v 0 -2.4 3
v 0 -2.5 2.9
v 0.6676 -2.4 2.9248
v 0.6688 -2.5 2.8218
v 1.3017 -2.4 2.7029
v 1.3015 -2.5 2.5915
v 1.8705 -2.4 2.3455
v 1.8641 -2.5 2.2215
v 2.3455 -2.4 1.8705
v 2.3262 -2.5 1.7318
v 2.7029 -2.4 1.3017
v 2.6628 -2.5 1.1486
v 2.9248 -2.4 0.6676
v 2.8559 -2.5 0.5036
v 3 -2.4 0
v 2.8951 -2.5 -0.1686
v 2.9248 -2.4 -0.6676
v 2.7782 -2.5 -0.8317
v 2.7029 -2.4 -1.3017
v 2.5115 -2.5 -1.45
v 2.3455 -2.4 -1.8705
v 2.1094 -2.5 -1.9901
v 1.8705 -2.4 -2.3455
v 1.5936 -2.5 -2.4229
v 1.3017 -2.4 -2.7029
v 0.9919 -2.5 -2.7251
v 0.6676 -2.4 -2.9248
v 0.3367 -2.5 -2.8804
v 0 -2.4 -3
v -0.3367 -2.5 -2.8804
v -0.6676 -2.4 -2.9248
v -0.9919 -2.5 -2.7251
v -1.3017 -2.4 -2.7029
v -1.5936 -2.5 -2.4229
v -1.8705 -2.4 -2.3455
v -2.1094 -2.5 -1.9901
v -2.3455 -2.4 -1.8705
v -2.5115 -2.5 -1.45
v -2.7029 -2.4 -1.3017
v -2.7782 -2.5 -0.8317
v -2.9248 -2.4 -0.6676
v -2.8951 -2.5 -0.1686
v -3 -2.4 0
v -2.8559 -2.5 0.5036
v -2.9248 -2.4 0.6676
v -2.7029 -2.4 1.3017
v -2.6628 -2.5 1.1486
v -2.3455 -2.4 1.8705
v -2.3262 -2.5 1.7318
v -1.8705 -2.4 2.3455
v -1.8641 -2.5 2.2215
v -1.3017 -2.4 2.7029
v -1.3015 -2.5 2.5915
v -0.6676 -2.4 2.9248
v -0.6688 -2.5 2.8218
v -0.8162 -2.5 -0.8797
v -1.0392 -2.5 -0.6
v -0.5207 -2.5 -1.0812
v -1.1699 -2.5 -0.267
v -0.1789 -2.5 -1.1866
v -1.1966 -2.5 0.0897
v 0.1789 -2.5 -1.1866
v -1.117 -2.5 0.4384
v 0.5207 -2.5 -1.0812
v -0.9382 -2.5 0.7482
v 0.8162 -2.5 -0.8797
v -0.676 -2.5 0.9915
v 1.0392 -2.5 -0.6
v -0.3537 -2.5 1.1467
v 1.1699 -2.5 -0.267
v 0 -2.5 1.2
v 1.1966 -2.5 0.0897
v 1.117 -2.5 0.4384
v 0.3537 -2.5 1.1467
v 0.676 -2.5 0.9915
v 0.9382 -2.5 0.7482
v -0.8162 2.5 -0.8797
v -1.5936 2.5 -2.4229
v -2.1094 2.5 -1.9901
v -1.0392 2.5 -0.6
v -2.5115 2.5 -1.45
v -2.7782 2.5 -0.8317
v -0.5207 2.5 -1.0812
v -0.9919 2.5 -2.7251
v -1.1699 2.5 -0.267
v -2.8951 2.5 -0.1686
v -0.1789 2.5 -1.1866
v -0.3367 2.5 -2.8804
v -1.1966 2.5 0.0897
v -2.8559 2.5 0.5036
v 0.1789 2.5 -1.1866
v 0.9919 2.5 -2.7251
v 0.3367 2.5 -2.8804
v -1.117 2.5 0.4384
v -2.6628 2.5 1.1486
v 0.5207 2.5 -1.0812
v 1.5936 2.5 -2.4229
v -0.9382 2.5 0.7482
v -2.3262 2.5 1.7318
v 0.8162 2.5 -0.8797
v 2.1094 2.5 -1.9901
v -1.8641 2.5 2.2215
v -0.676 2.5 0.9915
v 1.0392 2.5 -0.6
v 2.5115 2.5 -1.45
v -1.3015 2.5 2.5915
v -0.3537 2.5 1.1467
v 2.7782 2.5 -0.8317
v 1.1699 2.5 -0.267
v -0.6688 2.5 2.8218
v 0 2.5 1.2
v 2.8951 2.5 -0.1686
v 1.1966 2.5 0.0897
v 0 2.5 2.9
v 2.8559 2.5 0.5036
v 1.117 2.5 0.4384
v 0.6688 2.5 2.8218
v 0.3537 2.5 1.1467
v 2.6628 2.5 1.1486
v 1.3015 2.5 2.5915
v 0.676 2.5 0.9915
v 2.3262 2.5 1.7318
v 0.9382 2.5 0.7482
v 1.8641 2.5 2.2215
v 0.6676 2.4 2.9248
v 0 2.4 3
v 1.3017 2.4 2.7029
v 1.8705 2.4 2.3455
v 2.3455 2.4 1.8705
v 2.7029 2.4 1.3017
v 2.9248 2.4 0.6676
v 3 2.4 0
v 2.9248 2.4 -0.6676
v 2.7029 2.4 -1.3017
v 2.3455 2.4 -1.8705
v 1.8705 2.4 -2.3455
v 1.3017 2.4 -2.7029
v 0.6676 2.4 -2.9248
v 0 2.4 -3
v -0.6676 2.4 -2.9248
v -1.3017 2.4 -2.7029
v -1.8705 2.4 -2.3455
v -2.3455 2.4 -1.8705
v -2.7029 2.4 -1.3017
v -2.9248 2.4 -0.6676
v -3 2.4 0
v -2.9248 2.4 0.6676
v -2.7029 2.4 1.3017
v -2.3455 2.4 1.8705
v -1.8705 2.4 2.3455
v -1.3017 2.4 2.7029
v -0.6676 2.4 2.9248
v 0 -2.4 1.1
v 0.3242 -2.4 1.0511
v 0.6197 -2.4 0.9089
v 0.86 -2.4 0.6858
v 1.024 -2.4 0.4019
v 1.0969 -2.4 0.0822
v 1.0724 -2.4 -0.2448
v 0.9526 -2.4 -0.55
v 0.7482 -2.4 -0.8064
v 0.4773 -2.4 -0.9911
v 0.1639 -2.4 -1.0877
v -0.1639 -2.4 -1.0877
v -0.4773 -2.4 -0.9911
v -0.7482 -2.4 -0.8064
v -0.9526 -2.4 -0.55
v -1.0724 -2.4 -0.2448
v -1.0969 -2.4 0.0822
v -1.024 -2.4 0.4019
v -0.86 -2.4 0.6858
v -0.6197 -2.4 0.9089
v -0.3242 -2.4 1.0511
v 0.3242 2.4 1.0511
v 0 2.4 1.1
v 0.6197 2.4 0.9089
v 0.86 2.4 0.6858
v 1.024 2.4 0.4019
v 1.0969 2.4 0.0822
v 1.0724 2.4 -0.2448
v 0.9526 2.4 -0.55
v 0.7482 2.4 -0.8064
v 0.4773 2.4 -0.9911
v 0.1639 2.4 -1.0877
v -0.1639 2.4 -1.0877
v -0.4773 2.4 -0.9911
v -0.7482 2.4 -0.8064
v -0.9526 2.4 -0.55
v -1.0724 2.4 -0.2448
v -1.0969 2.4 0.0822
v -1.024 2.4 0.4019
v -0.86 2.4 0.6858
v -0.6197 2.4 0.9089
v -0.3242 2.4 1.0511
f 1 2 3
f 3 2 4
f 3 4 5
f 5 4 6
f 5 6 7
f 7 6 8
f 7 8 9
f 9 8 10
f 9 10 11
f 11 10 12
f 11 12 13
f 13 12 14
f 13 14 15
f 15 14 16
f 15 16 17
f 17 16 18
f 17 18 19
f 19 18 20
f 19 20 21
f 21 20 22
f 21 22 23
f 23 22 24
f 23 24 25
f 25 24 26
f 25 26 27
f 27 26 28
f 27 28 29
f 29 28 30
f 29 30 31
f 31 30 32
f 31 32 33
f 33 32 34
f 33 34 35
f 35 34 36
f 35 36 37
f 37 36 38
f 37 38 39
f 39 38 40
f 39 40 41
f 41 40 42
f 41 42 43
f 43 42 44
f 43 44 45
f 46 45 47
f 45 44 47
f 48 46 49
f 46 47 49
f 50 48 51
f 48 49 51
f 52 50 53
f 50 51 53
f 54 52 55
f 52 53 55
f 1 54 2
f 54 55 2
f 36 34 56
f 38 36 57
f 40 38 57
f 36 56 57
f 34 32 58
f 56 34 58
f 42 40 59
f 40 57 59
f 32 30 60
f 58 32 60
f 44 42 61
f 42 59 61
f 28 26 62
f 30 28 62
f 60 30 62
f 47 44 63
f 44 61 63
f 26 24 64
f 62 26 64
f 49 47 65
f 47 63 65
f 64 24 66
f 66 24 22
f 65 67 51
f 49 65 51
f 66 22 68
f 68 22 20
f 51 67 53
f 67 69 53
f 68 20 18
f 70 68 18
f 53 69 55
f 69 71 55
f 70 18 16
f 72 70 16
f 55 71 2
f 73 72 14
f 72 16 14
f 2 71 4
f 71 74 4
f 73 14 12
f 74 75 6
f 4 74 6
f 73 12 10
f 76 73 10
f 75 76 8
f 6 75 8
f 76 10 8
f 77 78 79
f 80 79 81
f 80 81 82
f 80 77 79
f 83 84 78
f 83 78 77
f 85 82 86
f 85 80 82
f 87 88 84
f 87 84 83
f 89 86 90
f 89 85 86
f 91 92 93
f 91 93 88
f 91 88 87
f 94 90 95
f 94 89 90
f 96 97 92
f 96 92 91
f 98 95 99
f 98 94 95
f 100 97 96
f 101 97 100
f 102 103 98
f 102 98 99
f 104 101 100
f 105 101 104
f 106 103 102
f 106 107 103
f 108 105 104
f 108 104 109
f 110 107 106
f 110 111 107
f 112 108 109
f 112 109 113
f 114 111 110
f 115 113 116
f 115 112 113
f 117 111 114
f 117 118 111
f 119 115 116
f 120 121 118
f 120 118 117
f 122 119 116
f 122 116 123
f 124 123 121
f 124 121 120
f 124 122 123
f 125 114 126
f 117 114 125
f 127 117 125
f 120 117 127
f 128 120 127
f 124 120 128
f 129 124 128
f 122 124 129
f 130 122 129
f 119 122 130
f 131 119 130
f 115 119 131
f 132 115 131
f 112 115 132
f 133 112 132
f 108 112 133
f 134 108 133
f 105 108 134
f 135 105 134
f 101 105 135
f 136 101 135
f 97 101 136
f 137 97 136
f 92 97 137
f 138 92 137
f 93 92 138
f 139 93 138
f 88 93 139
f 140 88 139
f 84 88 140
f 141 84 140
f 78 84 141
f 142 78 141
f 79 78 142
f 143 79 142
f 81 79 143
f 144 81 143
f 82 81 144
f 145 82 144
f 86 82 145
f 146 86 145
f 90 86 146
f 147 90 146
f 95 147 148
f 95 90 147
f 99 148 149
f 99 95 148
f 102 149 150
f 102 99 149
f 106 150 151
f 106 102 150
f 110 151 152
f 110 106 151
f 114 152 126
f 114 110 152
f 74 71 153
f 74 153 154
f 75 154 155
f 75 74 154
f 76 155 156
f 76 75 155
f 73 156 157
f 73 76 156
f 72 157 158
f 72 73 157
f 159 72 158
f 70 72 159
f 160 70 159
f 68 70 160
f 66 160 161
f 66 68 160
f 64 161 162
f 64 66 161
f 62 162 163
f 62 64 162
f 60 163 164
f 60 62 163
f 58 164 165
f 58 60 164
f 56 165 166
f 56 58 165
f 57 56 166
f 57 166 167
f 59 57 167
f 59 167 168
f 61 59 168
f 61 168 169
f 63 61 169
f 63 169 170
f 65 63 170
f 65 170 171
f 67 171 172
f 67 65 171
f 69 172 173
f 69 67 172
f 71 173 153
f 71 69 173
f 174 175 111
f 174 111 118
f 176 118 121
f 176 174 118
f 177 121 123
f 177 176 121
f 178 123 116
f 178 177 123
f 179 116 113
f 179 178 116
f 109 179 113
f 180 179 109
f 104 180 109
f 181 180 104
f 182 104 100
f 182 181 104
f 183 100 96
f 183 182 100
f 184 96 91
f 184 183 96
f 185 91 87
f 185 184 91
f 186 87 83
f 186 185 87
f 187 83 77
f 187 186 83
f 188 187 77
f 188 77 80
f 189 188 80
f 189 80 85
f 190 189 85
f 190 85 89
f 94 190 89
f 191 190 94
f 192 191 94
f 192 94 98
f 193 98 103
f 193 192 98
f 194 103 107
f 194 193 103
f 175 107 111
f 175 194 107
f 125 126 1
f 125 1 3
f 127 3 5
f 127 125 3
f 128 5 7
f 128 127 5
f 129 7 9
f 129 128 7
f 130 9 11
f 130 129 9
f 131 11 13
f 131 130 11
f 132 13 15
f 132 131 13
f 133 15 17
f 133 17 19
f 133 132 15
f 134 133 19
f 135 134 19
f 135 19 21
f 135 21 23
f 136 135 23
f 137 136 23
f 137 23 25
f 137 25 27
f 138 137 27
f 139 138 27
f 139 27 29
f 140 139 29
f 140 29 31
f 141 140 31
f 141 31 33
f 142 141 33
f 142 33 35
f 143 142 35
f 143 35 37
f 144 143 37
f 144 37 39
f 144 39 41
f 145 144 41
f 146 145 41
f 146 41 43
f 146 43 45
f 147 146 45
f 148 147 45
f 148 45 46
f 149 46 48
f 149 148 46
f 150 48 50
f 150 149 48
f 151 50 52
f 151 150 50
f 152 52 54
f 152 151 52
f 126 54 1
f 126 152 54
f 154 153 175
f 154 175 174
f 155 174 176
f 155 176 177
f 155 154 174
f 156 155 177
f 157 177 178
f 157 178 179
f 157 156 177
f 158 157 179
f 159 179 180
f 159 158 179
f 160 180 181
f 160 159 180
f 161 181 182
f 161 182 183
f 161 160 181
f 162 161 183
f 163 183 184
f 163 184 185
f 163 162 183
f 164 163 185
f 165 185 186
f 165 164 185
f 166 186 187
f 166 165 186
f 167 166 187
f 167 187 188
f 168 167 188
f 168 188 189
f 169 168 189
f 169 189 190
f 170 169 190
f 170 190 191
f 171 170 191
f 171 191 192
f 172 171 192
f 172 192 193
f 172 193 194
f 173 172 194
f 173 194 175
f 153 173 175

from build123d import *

# Parameters (mm, degrees)
SKETCH_1_R      = 3
SKETCH_1_R_2    = 1.1
EXTRUDE_1_DEPTH = 2.5
CHAMFER_1_SIZE  = 0.1


with BuildPart() as part:
    # ｽｹｯﾁ1 → ﾎﾞｽ - 押し出し1 (new, symmetric)
    with BuildSketch(Plane(origin=(0, 0, 0), x_dir=(1, 0, 0), z_dir=(0, 1, 0))):
        with Locations(Location((0, 0, 0), (0, 0, 270))):
            Circle(SKETCH_1_R)
        with Locations(Location((0, 0, 0), (0, 0, 270))):
            Circle(SKETCH_1_R_2, mode=Mode.SUBTRACT)
    extrude(amount=EXTRUDE_1_DEPTH, both=True)

    # 面取り1
    chamfer_1_edges = [part.edges().sort_by_distance(p)[0] for p in [
        (0, -2.5, -3),
        (0, 2.5, -3),
        (0, -2.5, -1.1),
        (0, 2.5, -1.1),
    ]]
    chamfer(chamfer_1_edges, length=CHAMFER_1_SIZE)


solid = part.part
